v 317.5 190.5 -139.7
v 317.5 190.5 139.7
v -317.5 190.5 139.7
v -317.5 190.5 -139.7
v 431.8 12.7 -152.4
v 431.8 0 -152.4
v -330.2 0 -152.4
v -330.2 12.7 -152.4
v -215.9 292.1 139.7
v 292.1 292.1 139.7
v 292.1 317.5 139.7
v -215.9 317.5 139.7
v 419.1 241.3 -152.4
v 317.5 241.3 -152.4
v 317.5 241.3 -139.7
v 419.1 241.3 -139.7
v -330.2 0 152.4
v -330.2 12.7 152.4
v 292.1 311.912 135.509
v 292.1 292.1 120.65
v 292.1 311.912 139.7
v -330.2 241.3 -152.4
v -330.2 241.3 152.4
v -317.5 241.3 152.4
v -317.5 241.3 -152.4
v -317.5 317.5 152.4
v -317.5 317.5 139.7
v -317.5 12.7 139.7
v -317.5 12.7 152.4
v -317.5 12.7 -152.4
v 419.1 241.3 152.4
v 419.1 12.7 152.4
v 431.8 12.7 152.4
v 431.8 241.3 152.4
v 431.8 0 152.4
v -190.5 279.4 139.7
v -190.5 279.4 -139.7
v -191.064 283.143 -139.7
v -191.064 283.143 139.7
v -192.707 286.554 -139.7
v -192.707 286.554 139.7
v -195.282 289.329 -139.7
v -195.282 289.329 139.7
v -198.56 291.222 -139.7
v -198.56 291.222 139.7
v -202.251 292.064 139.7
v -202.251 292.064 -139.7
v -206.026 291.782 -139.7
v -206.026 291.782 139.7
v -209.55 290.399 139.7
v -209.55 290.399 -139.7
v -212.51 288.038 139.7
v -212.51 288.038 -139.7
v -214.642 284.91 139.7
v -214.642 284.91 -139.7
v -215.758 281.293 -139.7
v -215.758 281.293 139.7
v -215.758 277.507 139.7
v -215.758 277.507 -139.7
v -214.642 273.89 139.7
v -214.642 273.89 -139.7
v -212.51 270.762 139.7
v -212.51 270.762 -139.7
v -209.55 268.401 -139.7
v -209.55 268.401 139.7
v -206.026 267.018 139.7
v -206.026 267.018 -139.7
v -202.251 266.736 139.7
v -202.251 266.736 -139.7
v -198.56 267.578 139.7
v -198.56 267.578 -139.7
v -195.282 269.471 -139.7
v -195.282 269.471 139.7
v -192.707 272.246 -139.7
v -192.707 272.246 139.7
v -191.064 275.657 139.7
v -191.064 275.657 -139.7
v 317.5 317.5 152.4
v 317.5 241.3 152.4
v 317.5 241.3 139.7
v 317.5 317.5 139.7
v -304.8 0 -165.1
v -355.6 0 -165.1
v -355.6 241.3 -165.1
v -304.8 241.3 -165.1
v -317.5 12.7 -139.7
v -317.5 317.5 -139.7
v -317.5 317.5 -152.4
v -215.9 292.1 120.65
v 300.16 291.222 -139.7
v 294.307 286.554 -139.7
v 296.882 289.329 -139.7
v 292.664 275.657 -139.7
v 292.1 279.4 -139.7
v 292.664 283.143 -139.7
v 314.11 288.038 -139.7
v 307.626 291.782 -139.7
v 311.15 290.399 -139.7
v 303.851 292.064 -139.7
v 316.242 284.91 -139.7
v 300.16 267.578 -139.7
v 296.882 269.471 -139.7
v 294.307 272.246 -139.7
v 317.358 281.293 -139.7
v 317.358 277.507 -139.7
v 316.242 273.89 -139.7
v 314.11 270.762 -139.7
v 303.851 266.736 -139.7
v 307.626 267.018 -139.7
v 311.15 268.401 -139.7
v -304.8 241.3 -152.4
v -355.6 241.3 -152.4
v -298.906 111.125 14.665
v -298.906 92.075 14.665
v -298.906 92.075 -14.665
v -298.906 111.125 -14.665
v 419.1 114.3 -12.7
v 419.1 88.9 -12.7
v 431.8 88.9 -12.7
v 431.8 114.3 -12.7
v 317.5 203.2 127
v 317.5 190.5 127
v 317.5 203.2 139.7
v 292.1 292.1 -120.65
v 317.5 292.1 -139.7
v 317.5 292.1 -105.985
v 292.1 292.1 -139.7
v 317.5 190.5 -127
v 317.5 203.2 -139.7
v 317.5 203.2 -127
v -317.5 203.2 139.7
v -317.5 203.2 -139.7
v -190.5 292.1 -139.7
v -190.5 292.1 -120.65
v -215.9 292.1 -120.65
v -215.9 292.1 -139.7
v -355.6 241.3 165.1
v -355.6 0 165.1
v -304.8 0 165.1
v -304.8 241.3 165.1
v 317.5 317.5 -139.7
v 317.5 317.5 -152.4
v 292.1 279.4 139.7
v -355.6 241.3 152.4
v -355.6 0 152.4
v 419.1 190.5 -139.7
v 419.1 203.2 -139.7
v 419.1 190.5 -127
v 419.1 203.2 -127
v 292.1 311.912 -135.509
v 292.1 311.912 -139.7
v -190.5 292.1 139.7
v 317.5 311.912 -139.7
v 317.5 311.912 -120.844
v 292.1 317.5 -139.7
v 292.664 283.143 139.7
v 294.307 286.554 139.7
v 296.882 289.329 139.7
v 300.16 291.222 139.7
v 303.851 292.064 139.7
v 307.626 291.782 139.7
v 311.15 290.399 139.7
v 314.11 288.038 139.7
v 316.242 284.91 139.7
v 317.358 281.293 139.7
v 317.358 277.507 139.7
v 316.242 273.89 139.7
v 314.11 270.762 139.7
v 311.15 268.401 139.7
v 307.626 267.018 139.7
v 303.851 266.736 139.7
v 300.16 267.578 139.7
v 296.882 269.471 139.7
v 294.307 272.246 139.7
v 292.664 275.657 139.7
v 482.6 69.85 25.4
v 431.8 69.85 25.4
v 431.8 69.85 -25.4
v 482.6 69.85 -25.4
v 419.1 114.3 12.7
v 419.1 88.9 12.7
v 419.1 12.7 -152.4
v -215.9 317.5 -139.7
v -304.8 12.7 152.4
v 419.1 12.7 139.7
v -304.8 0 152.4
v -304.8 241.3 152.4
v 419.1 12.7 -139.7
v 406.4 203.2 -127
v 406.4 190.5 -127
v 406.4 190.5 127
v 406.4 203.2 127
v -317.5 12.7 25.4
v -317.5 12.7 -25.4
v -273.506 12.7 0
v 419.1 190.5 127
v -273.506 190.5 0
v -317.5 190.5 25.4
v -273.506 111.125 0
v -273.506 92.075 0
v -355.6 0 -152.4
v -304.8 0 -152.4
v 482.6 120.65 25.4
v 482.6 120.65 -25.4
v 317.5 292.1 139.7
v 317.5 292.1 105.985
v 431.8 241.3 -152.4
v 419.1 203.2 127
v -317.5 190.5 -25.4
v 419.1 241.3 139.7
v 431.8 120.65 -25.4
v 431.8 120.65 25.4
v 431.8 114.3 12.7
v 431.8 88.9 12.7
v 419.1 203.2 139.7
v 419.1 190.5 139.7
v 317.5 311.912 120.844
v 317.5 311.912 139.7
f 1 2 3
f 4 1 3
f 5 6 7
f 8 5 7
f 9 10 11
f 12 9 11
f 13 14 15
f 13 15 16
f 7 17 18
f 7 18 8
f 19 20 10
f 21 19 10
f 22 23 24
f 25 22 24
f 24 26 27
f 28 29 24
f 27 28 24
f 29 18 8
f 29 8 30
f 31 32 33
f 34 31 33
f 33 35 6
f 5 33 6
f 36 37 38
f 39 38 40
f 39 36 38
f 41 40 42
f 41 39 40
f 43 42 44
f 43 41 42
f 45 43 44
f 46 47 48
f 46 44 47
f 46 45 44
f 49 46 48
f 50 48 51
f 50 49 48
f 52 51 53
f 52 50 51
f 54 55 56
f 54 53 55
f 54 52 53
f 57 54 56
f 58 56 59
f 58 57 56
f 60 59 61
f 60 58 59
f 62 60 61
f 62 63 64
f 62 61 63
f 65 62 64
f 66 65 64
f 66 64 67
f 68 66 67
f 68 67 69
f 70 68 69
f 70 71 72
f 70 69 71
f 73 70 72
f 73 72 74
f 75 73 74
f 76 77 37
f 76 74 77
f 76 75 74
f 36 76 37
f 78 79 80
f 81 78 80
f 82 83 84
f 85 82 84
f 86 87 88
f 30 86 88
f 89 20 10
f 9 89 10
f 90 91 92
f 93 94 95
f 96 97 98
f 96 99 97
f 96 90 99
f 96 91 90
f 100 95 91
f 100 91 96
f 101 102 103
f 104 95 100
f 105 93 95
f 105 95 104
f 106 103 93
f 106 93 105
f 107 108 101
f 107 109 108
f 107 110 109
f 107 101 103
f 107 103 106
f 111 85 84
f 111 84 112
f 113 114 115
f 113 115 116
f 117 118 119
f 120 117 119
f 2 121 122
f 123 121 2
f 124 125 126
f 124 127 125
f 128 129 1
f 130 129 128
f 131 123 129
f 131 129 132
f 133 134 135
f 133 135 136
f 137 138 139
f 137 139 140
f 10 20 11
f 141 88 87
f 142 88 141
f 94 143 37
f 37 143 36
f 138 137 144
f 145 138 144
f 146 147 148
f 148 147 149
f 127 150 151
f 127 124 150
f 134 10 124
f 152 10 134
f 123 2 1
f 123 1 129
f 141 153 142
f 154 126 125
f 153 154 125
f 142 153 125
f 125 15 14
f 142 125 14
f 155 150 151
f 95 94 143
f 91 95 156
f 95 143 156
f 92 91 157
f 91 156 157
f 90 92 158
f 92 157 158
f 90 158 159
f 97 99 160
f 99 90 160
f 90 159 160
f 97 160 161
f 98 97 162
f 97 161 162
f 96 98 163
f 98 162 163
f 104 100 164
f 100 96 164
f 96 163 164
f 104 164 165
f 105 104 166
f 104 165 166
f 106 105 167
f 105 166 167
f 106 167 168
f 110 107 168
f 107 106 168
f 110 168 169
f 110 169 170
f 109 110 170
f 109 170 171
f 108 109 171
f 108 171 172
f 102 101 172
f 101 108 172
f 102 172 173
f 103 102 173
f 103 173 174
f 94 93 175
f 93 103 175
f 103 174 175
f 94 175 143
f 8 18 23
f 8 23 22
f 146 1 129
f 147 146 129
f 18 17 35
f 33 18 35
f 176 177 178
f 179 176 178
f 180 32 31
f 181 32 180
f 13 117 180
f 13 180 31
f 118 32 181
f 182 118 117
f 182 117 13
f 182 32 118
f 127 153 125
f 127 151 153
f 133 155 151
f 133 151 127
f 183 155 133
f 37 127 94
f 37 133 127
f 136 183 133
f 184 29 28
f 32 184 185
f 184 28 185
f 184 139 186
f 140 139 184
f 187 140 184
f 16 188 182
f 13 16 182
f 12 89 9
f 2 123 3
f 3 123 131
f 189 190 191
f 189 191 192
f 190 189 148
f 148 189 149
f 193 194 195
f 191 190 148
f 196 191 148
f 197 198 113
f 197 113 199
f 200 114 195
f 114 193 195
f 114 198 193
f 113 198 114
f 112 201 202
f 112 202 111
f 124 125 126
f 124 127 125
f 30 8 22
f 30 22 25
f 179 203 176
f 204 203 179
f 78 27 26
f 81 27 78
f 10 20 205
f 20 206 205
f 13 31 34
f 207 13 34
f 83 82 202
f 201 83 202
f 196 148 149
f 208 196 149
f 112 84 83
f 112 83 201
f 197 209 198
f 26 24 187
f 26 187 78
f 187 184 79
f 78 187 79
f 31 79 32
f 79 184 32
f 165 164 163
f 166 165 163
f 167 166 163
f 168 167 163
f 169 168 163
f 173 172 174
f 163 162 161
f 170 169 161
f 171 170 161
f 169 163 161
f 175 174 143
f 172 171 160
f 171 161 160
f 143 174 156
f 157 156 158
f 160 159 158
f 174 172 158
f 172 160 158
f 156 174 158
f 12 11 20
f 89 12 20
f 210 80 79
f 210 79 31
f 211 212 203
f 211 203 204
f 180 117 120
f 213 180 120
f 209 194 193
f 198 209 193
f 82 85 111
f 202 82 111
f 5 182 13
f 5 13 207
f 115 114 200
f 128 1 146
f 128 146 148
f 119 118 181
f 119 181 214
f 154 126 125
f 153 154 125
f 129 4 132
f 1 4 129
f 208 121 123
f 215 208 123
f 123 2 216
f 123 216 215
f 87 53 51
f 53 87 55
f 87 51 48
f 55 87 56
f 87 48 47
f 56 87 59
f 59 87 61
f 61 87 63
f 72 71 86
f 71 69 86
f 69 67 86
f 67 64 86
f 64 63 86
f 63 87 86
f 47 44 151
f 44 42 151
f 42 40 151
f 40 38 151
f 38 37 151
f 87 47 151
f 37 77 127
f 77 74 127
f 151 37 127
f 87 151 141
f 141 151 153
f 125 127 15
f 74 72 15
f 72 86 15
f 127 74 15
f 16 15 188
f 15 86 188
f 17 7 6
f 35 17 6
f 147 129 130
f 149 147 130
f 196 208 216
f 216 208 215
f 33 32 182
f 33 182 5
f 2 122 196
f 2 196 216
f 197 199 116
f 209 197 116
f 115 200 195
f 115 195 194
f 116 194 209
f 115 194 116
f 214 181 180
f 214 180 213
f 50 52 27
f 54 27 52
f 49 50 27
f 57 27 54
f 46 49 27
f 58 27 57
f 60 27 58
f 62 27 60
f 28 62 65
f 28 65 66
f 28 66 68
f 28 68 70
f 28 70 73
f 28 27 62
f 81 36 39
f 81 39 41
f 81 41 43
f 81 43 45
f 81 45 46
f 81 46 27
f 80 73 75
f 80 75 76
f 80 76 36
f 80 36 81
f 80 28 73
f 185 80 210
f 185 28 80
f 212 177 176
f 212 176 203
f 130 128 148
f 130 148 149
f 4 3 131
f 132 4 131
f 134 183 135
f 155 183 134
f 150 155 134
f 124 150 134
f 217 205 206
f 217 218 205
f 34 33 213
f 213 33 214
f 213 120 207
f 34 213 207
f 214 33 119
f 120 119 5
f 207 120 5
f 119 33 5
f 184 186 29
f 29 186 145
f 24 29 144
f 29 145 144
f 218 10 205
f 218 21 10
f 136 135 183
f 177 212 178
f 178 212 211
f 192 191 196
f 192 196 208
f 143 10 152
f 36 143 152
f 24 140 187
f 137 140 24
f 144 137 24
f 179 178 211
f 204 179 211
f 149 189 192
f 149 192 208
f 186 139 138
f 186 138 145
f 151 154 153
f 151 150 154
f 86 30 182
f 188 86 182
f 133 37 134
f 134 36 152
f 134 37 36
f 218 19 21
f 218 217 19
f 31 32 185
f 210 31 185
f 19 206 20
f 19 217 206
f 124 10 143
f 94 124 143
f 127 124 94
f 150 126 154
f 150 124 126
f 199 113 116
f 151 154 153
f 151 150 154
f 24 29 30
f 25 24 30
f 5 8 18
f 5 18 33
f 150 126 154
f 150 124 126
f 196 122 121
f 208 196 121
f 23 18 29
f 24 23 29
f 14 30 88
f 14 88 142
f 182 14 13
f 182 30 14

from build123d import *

# Parameters (mm, degrees)
SKETCH1_W                             = 660.4
SKETCH1_H                             = 304.8
SKETCH1_W_2                           = 101.6
FOND_DEPTH                            = 12.7
SKETCH2_W                             = 736.6
SKETCH2_H                             = 12.7
COT_S_HAUT_DEPTH                      = 228.6
COT_S_HAUT_2_DEPTH                    = 228.6
SKETCH3_W                             = 12.7
SKETCH3_H                             = 304.8
COT_ES_BAS_DEPTH                      = 228.6
COT_ES_BAS_2_DEPTH                    = 228.6
SKETCH4_W                             = 635
SKETCH4_H                             = 12.7
SUPPORT_CAGE_DEPTH                    = 76.2
SKETCH5_W                             = 12.7
SKETCH5_H                             = 12.7
SUPPORT_TRAPPE_COT_ES_DEPTH           = 101.6
SUPPORT_TRAPPE_COT_ES_2_DEPTH         = 101.6
SUPPORT_TRAPPE_DEVANT_REACH           = 606.419
SKETCH6_W                             = 12.7
SKETCH6_H                             = 12.7
PLANCHER_MILLIEU_REACH                = 612.393
SKETCH7_W                             = 635
SKETCH7_H                             = 12.7
ROULEAU_REACH                         = 612.393
SKETCH8_R                             = 12.7
SKETCH10_W                            = 482.6
SKETCH10_H                            = 12.7
SOUTIEN_TAPIS_DEPTH                   = 279.4
REBORD_START                          = -25.4
REBORD_TAPIS_DEPTH                    = 508
V_POUR_VIS_SANS_FIN_DEPTH             = 177.8
TROU_V_VIS_SANS_FIN_REACH             = 559.21
SKETCH17_W                            = 25.4
SKETCH17_H                            = 19.05
TROU_V_VIS_SANS_FIN_DIRECTION_2_REACH = 559.21
TROU_SORTIE_VIS_SANS_FIN_DEPTH        = 12.7
TROU_SORTIE_VIS_SANS_FIN_DEPTH_BACK   = 12.7
SKETCH18_W                            = 12.7
SKETCH18_H                            = 25.4
SKETCH19_W                            = 12.7
SKETCH19_H                            = 241.3
REBORD_POUR_SAC_POUBELLE_DEPTH        = 25.4
SKETCH31_W                            = 50.8
SKETCH31_H                            = 50.8
BOITE_MOTEUR_VIS_SANS_DEPTH           = 50.8


with BuildPart() as part:
    # Sketch1 → Fond (new body)
    with BuildSketch(Plane(origin=(0, 0, 0), x_dir=(1, 0, 0), z_dir=(0, 1, 0))):
        Rectangle(SKETCH1_W, SKETCH1_H)
        with Locations((381, 0)):
            Rectangle(SKETCH1_W_2, SKETCH1_H)
    extrude(amount=FOND_DEPTH)


with BuildPart() as body_2:
    # Sketch2 → Cotés Haut (new body)
    with BuildSketch(Plane(origin=(0, 12.7, 0), x_dir=(1, 0, 0), z_dir=(0, 1, 0))):
        with Locations((50.8, 146.05)):
            Rectangle(SKETCH2_W, SKETCH2_H)
    extrude(amount=COT_S_HAUT_DEPTH)



with BuildPart() as body_3:
    # Sketch2 → Cot_s Haut 2 (new body)
    with BuildSketch(Plane(origin=(0, 12.7, 0), x_dir=(1, 0, 0), z_dir=(0, 1, 0))):
        with Locations((50.8, -146.05)):
            Rectangle(SKETCH2_W, SKETCH2_H)
    extrude(amount=COT_S_HAUT_2_DEPTH)


with BuildPart() as body_4:
    # Sketch3 → Cotées Bas (new body)
    with BuildSketch(Plane(origin=(0, 12.7, 0), x_dir=(1, 0, 0), z_dir=(0, 1, 0))):
        with Locations((-323.85, 0)):
            Rectangle(SKETCH3_W, SKETCH3_H)
    extrude(amount=COT_ES_BAS_DEPTH)


with BuildPart() as body_5:
    # Sketch3 → Cot_es Bas 2 (new body)
    with BuildSketch(Plane(origin=(0, 12.7, 0), x_dir=(1, 0, 0), z_dir=(0, 1, 0))):
        with Locations((425.45, 0)):
            Rectangle(SKETCH3_W, SKETCH3_H)
    extrude(amount=COT_ES_BAS_2_DEPTH)

    # Sketch18 → Trou sortie vis sans fin (cut, two sides: drawn at the far end of the back side and taken through both)
    with BuildSketch(Plane.XY.offset(-TROU_SORTIE_VIS_SANS_FIN_DEPTH_BACK)):
        with Locations((425.45, 101.6)):
            Rectangle(SKETCH18_W, SKETCH18_H)
    extrude(amount=TROU_SORTIE_VIS_SANS_FIN_DEPTH + TROU_SORTIE_VIS_SANS_FIN_DEPTH_BACK, mode=Mode.SUBTRACT)


with BuildPart() as body_2_1:
    add(body_2.part)

    add(body_3.part)  # Support Cage merges body 3
    # Sketch4 → Support Cage (add)
    with BuildSketch(Plane(origin=(0, 241.3, 0), x_dir=(1, 0, 0), z_dir=(0, 1, 0))):
        with Locations((0, 146.05)):
            Rectangle(SKETCH4_W, SKETCH4_H)
        with Locations((0, -146.05)):
            Rectangle(SKETCH4_W, SKETCH4_H)
    extrude(amount=SUPPORT_CAGE_DEPTH)


with BuildPart() as body_5_2:
    # Sketch5 → Support Trappe cotées (new body)
    with BuildSketch(Plane.ZY.offset(-419.1)):
        with Locations((-133.35, 196.85)):
            Rectangle(SKETCH5_W, SKETCH5_H)
    extrude(amount=SUPPORT_TRAPPE_COT_ES_DEPTH)


with BuildPart() as body_6:
    # Sketch5 → Support Trappe cot_es 2 (new body)
    with BuildSketch(Plane.ZY.offset(-419.1)):
        with Locations((133.35, 196.85)):
            Rectangle(SKETCH5_W, SKETCH5_H)
    extrude(amount=SUPPORT_TRAPPE_COT_ES_2_DEPTH)


with BuildPart() as body_7:

    # Sketch6 → Support Trappe devant (new, up to next)
    with BuildSketch(Plane.XY.offset(-127), mode=Mode.PRIVATE) as support_trappe_devant_sk1:
        with Locations((412.75, 196.85)):
            Rectangle(SKETCH6_W, SKETCH6_H)
    support_trappe_devant_tool1 = extrude(support_trappe_devant_sk1.sketch, amount=SUPPORT_TRAPPE_DEVANT_REACH, mode=Mode.PRIVATE) - body_6.part
    add(support_trappe_devant_tool1.solids().sort_by_distance((412.75, 196.85, -127))[0])


with BuildPart() as body_8:

    # Sketch7 → Plancher millieu (new, up to next)
    with BuildSketch(Plane(origin=(0, 0, 139.7), x_dir=(-1, 0, 0), z_dir=(0, 0, -1)), mode=Mode.PRIVATE) as plancher_millieu_sk1:
        with Locations((0, 196.85)):
            Rectangle(SKETCH7_W, SKETCH7_H)
    plancher_millieu_tool1 = extrude(plancher_millieu_sk1.sketch, amount=PLANCHER_MILLIEU_REACH, mode=Mode.PRIVATE) - body_2_1.part
    add(plancher_millieu_tool1.solids().sort_by_distance((0, 196.85, 139.7))[0])


with BuildPart() as body_9:

    # Sketch8 → Rouleau (new, up to next)
    with BuildSketch(Plane(origin=(0, 0, 139.7), x_dir=(-1, 0, 0), z_dir=(0, 0, -1)), mode=Mode.PRIVATE) as rouleau_sk1:
        with Locations((-304.8, 279.4)):
            Circle(SKETCH8_R)
    rouleau_tool1 = extrude(rouleau_sk1.sketch, amount=ROULEAU_REACH, mode=Mode.PRIVATE) - body_2_1.part
    rouleau = rouleau_tool1.solids().sort_by_distance((304.8, 279.4, 139.7))[0]
    add(rouleau)


with BuildPart() as body_2_2:
    add(body_2_1.part)

    # Mirror1: Rouleau across plane
    add(rouleau.mirror(Plane(origin=(50.8, 0, 0), x_dir=(0, 0, 1), z_dir=(1, 0, 0))))

    # Mirror9 2: loft between two sections, ruled curve by curve
    mirror9_2_from = [
        Edge.make_line((317.5, 311.912, -120.844303163), (317.5, 311.912, -139.7)),
        Edge.make_line((317.5, 292.1, -139.7), (317.5, 292.1, -105.985303163)),
        Edge.make_line((317.5, 292.1, -105.985303163), (317.5, 311.912, -120.844303163)),
        Edge.make_line((317.5, 292.1, -139.7), (317.5, 311.912, -139.7)),
    ]
    mirror9_2_to = [
        Edge.make_line((292.1, 311.912, -135.509), (292.1, 311.912, -139.7)),
        Edge.make_line((292.1, 292.1, -139.7), (292.1, 292.1, -120.65)),
        Edge.make_line((292.1, 292.1, -120.65), (292.1, 311.912, -135.509)),
        Edge.make_line((292.1, 292.1, -139.7), (292.1, 311.912, -139.7)),
    ]
    mirror9_2 = Solid(Shell([*[Face.make_surface_from_curves(mirror9_2_from[k], mirror9_2_to[k]) for k in range(4)], Face(Wire(mirror9_2_from)), Face(Wire(mirror9_2_to))]))
    add(mirror9_2)


with BuildPart() as body_10:
    # Sketch10 → Soutien tapis (new body)
    with BuildSketch(Plane(origin=(0, 0, 139.7), x_dir=(-1, 0, 0), z_dir=(0, 0, -1))):
        with Locations((-50.8, 285.75)):
            Rectangle(SKETCH10_W, SKETCH10_H)
    extrude(amount=SOUTIEN_TAPIS_DEPTH)


with BuildPart() as body_11:
    # Sketch11 → Rebord tapis (new body)
    with BuildSketch(Plane(origin=(317.5, 0, 0), x_dir=(0, 0, -1), z_dir=(1, 0, 0)).offset(REBORD_START)):
        Polygon((-139.7, 317.5), (-120.65, 292.1), (-139.7, 292.1), align=None)
    rebord_tapis = extrude(amount=-REBORD_TAPIS_DEPTH)


with BuildPart() as body_10_1:
    add(body_10.part)

    # Mirror5: Rebord tapis across plane
    add(rebord_tapis.mirror(Plane.XY))

    # Mirror9: read off the stored shape, not the designer's step
    # Mirror9: loft between two sections, ruled curve by curve
    mirror9_from = [
        Edge.make_line((317.5, 292.1, -139.7), (317.5, 292.1, -105.985303163)),
        Edge.make_line((317.5, 311.912, -120.844303163), (317.5, 311.912, -139.7)),
        Edge.make_line((317.5, 292.1, -105.985303163), (317.5, 311.912, -120.844303163)),
        Edge.make_line((317.5, 311.912, -139.7), (317.5, 292.1, -139.7)),
    ]
    mirror9_to = [
        Edge.make_line((292.1, 292.1, -139.7), (292.1, 292.1, -120.65)),
        Edge.make_line((292.1, 311.912, -135.509), (292.1, 311.912, -139.7)),
        Edge.make_line((292.1, 292.1, -120.65), (292.1, 311.912, -135.509)),
        Edge.make_line((292.1, 311.912, -139.7), (292.1, 292.1, -139.7)),
    ]
    mirror9 = Solid(Shell([*[Face.make_surface_from_curves(mirror9_from[k], mirror9_to[k]) for k in range(4)], Face(Wire(mirror9_from)), Face(Wire(mirror9_to))]))
    add(mirror9)


with BuildPart() as body_12:
    # Sketch13 → V pour vis sans fin (new body)
    with BuildSketch(Plane(origin=(0, 12.7, 0), x_dir=(1, 0, 0), z_dir=(0, 1, 0))):
        Polygon((-273.505909488, 0), (-317.5, 25.4), (-317.5, -25.4), align=None)
    extrude(amount=V_POUR_VIS_SANS_FIN_DEPTH)

    # Trou V vis sans fin: up to this face of the body (flat: up to its plane)
    trou_v_vis_sans_fin_end = Plane(body_12.part.faces().sort_by_distance((-295.502954744, 101.6, -12.7))[0])
    # Sketch17 → Trou V vis sans fin (cut, up to the picked face)
    with BuildSketch(Plane.XY, mode=Mode.PRIVATE) as trou_v_vis_sans_fin_sk1:
        with Locations((-286.205909488, 101.6)):
            Rectangle(SKETCH17_W, SKETCH17_H)
    trou_v_vis_sans_fin_tool1 = split(extrude(trou_v_vis_sans_fin_sk1.sketch, amount=-TROU_V_VIS_SANS_FIN_REACH, mode=Mode.PRIVATE), bisect_by=trou_v_vis_sans_fin_end, keep=Keep.BOTH, mode=Mode.PRIVATE)
    add(trou_v_vis_sans_fin_tool1.solids().sort_by(Axis((-286.205909, 101.6, 0), (0, 0, -1)))[0], mode=Mode.SUBTRACT)

    # Trou V vis sans fin direction 2: up to this face of the body (flat: up to its plane)
    trou_v_vis_sans_fin_direction_2_end = Plane(body_12.part.faces().sort_by_distance((-295.502954744, 101.6, 12.7))[0])
    # Sketch17 → Trou V vis sans fin direction 2 (cut, up to the picked face)
    with BuildSketch(Plane.XY, mode=Mode.PRIVATE) as trou_v_vis_sans_fin_direction_2_sk1:
        with Locations((-286.205909488, 101.6)):
            Rectangle(SKETCH17_W, SKETCH17_H)
    trou_v_vis_sans_fin_direction_2_tool1 = split(extrude(trou_v_vis_sans_fin_direction_2_sk1.sketch, amount=TROU_V_VIS_SANS_FIN_DIRECTION_2_REACH, mode=Mode.PRIVATE), bisect_by=trou_v_vis_sans_fin_direction_2_end, keep=Keep.BOTH, mode=Mode.PRIVATE)
    add(trou_v_vis_sans_fin_direction_2_tool1.solids().sort_by(Axis((-286.205909, 101.6, 0), (0, 0, 1)))[0], mode=Mode.SUBTRACT)


with BuildPart() as body_13:
    # Sketch19 → Rebord pour sac poubelle (new, symmetric)
    with BuildSketch(Plane.ZY.offset(330.2)):
        with Locations((-158.75, 120.65)):
            Rectangle(SKETCH19_W, SKETCH19_H)
    rebord_pour_sac_poubelle = extrude(amount=REBORD_POUR_SAC_POUBELLE_DEPTH, both=True)


with BuildPart() as body_14:
    # Rebord pour sac poubelle 2: read off the stored shape, not the designer's step
    # Rebord pour sac poubelle 2: loft between two sections, ruled curve by curve
    rebord_pour_sac_poubelle_2_from = [
        Edge.make_line((292.1, 292.1, 120.65), (292.1, 292.1, 139.7)),
        Edge.make_line((292.1, 292.1, 139.7), (317.5, 292.1, 139.7)),
        Edge.make_line((317.5, 292.1, 105.985303163), (292.1, 292.1, 120.65)),
        Edge.make_line((317.5, 292.1, 139.7), (317.5, 292.1, 105.985303163)),
    ]
    rebord_pour_sac_poubelle_2_to = [
        Edge.make_line((292.1, 311.912, 135.509), (292.1, 311.912, 139.7)),
        Edge.make_line((292.1, 311.912, 139.7), (317.5, 311.912, 139.7)),
        Edge.make_line((317.5, 311.912, 120.844303163), (292.1, 311.912, 135.509)),
        Edge.make_line((317.5, 311.912, 139.7), (317.5, 311.912, 120.844303163)),
    ]
    rebord_pour_sac_poubelle_2 = Solid(Shell([*[Face.make_surface_from_curves(rebord_pour_sac_poubelle_2_from[k], rebord_pour_sac_poubelle_2_to[k]) for k in range(4)], Face(Wire(rebord_pour_sac_poubelle_2_from)), Face(Wire(rebord_pour_sac_poubelle_2_to))]))
    add(rebord_pour_sac_poubelle_2)


with BuildPart() as body_15:
    # Sketch31 → Boite moteur vis sans (new body)
    with BuildSketch(Plane(origin=(431.8, 0, 0), x_dir=(0, 0, -1), z_dir=(1, 0, 0))):
        with Locations((0, 95.25)):
            Rectangle(SKETCH31_W, SKETCH31_H)
    extrude(amount=BOITE_MOTEUR_VIS_SANS_DEPTH)


with BuildPart() as body_2_3:
    add(body_2_2.part)

    # Mirror11: Rebord pour sac poubelle across plane
    add(rebord_pour_sac_poubelle.mirror(Plane.XY))


solid = Compound([part.part, body_4.part, body_5.part, body_5_2.part, body_6.part, body_7.part, body_8.part, body_9.part, body_11.part, body_10_1.part, body_12.part, body_13.part, body_14.part, body_15.part, body_2_3.part])
